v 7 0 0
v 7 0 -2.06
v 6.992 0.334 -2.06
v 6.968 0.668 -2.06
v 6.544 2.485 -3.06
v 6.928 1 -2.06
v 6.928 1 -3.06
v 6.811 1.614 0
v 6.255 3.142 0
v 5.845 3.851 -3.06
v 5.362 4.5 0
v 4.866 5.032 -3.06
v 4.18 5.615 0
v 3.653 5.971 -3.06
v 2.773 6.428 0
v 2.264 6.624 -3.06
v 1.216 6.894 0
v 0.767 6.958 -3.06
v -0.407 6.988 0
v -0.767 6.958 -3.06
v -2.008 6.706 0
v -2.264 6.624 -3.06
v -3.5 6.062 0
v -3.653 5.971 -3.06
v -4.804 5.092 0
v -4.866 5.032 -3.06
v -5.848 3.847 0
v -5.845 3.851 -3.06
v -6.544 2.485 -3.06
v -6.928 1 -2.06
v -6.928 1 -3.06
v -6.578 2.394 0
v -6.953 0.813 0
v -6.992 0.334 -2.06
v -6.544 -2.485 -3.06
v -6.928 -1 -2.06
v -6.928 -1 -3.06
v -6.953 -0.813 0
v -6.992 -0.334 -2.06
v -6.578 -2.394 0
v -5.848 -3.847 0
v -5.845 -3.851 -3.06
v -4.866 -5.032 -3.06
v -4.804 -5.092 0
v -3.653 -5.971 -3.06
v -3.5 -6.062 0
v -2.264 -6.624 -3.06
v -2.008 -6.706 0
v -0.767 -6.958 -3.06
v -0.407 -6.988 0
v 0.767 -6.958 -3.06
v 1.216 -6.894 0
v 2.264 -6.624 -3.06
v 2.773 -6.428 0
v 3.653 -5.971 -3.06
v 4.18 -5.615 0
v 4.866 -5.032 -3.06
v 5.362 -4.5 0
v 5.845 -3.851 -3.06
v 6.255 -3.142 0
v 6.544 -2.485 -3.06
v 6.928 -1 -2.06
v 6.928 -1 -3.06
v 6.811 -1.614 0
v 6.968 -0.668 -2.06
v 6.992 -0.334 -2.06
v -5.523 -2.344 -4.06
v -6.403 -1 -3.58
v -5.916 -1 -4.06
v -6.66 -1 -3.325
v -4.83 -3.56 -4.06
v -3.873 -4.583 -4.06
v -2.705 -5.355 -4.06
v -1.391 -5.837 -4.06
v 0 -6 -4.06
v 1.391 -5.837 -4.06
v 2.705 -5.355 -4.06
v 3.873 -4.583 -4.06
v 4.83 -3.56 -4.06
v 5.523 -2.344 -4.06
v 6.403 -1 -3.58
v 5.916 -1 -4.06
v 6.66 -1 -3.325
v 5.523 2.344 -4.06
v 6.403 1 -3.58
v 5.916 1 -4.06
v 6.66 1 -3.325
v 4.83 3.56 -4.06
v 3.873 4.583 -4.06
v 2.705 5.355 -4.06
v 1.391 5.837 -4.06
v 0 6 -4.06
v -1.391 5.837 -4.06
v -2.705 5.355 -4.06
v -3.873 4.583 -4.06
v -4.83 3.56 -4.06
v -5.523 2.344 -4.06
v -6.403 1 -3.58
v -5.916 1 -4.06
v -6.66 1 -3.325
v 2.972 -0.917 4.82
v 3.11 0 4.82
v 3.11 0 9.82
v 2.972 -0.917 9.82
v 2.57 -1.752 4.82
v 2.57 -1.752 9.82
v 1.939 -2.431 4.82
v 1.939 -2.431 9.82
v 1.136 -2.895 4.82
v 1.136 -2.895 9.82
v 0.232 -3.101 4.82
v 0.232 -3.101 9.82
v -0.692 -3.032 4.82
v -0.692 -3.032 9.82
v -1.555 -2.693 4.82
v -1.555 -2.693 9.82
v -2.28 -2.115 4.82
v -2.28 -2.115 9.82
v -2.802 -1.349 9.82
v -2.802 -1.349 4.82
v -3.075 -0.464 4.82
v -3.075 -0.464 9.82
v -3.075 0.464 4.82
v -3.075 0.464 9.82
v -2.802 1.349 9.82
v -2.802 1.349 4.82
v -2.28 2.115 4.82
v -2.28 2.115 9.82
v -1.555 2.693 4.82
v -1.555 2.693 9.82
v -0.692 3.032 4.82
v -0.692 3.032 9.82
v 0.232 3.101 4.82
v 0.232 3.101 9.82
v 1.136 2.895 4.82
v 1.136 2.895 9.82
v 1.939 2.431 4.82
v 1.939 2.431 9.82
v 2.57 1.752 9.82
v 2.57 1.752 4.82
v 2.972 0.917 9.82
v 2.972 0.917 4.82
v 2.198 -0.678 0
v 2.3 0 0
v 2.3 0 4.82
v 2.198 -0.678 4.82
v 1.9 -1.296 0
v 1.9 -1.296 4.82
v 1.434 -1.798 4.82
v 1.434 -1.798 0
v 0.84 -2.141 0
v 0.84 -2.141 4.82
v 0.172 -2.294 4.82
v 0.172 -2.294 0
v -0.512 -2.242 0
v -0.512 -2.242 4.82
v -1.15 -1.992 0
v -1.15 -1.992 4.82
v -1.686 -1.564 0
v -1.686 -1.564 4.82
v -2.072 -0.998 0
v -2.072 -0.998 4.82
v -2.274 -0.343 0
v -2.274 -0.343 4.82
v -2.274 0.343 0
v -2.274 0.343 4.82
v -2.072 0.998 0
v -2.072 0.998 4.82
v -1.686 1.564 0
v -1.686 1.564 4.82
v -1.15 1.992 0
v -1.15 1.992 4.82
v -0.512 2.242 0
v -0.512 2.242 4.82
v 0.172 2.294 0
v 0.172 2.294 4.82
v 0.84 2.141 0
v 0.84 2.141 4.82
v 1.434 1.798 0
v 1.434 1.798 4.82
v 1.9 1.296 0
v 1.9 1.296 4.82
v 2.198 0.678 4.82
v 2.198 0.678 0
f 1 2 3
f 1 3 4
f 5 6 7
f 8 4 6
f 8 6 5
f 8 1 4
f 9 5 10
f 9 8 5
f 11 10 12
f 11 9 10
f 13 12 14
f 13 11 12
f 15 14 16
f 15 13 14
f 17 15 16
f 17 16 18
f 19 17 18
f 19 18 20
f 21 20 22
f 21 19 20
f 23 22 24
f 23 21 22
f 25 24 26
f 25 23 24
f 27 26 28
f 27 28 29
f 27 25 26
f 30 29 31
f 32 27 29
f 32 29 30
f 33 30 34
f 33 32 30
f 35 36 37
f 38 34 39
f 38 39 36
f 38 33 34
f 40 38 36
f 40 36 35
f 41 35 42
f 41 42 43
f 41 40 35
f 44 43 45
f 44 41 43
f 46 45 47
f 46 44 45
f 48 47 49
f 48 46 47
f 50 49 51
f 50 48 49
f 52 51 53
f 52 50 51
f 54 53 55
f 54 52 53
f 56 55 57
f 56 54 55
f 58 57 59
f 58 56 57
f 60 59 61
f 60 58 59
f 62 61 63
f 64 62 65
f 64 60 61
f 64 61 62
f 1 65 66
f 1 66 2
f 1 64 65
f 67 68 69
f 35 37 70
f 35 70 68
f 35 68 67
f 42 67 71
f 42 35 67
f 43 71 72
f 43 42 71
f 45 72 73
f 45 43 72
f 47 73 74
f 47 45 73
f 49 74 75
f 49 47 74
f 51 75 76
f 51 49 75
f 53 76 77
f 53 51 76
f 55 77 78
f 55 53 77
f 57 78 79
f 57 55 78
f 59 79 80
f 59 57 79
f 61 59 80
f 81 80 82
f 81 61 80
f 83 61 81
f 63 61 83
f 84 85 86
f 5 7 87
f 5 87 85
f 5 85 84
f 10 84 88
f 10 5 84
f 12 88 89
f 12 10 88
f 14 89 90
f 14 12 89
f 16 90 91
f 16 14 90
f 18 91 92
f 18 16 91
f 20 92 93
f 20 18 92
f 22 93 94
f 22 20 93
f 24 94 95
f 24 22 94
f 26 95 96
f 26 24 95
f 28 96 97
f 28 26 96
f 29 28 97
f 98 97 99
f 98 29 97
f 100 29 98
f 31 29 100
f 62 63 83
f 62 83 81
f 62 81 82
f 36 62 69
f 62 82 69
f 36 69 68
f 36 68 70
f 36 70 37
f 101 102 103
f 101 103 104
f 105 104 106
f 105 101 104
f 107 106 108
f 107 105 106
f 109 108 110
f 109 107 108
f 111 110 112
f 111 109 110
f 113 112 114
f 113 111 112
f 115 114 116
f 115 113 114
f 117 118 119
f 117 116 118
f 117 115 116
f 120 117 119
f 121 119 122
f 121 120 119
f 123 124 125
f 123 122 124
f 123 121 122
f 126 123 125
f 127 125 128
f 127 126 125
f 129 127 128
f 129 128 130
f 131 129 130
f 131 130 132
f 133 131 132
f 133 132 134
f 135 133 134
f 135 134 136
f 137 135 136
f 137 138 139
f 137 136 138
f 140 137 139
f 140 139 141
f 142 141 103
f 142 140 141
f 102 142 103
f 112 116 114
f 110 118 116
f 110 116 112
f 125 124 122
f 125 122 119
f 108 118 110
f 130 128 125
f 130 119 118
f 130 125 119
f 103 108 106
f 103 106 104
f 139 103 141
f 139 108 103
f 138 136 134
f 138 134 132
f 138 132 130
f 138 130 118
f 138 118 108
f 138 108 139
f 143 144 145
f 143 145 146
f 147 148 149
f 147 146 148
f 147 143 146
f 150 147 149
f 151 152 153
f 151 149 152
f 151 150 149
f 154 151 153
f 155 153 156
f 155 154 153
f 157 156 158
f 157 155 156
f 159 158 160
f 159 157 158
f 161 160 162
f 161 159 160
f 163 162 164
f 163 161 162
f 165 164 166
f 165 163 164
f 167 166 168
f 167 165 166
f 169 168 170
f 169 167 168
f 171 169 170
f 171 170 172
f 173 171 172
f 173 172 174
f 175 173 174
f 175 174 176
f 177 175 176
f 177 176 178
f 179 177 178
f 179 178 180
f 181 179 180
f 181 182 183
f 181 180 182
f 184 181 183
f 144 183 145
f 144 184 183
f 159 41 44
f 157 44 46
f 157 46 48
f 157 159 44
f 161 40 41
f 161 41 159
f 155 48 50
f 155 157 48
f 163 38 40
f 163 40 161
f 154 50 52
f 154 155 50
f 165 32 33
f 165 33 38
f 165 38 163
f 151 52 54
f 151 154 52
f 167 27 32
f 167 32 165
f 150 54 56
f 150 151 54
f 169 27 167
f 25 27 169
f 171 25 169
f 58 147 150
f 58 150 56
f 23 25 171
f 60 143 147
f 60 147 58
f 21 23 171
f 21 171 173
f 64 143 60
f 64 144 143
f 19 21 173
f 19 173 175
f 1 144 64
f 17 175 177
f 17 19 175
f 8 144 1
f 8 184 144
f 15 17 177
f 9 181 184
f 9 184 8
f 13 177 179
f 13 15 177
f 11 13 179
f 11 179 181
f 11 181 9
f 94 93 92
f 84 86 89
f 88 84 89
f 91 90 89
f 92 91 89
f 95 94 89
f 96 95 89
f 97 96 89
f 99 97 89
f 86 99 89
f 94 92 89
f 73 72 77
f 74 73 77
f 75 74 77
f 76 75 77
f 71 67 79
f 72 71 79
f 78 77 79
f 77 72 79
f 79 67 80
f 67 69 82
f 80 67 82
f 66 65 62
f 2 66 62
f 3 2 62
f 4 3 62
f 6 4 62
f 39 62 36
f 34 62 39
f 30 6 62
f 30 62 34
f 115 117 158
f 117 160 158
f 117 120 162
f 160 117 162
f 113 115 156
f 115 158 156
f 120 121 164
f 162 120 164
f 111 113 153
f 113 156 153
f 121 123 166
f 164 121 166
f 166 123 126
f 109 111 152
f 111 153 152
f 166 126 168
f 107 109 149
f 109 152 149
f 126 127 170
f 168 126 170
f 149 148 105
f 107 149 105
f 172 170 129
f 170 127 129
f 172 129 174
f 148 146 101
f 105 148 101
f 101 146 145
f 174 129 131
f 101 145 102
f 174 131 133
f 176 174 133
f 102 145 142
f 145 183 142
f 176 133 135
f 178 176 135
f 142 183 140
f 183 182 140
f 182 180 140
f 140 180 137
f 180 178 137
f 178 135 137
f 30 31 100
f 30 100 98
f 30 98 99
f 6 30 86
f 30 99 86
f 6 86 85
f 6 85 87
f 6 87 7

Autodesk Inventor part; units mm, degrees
ref_plane "YZ Plane" through (0, 0, 0) normal (1, 0, 0) x (0, 1, 0)
ref_plane "XZ Plane" through (0, 0, 0) normal (0, 1, 0) x (-1, 0, 0)
ref_plane "XY Plane" through (0, 0, 0) normal (0, 0, 1) x (1, 0, 0)
sketch "Sketch1" plane through (0, 0, 0) normal (0, 0, 1) x (1, 0, 0)
  circle A0 centre (0, 0) radius 7
  circle A1 centre (0, 0) radius 2.3
  circle A2 centre (0, 0) radius 3.11
  dimension "d0" = 14
  dimension "d1" = 4.6
  dimension "d2" = 6.22
extrude "Extrusion1" add sketch "Sketch1" against normal blind 4.06 contours A0 | A1 | A2
extrude "Extrusion2" add sketch "Sketch1" along normal blind 9.82 contours A1 | A2
extrude "Extrusion3" cut sketch "Sketch1" along normal blind 4.82 contours A2
sketch "Sketch2" plane through (0, 0, -4.06) normal (0, 0, -1) x (-1, 0, 0)
  line L0 (7, 1) -> (-7, 1)
  line L1 (-7, 1) -> (-7, -1)
  line L2 (-7, -1) -> (7, -1)
  line L3 (7, -1) -> (7, 1)
  line L4 (7, 1) -> (-7, -1) construction
  line L5 (-7, 1) -> (7, -1) construction
  point P0 (0, 0)
  dimension "d9" = 2
extrude "Extrusion4" cut sketch "Sketch2" against normal blind 2
chamfer "Chamfer1" distance 1 angle 45 2 edges at (0, -7, -4.06) (0, 7, -4.06)
properties part number "AccessoryScrew"
